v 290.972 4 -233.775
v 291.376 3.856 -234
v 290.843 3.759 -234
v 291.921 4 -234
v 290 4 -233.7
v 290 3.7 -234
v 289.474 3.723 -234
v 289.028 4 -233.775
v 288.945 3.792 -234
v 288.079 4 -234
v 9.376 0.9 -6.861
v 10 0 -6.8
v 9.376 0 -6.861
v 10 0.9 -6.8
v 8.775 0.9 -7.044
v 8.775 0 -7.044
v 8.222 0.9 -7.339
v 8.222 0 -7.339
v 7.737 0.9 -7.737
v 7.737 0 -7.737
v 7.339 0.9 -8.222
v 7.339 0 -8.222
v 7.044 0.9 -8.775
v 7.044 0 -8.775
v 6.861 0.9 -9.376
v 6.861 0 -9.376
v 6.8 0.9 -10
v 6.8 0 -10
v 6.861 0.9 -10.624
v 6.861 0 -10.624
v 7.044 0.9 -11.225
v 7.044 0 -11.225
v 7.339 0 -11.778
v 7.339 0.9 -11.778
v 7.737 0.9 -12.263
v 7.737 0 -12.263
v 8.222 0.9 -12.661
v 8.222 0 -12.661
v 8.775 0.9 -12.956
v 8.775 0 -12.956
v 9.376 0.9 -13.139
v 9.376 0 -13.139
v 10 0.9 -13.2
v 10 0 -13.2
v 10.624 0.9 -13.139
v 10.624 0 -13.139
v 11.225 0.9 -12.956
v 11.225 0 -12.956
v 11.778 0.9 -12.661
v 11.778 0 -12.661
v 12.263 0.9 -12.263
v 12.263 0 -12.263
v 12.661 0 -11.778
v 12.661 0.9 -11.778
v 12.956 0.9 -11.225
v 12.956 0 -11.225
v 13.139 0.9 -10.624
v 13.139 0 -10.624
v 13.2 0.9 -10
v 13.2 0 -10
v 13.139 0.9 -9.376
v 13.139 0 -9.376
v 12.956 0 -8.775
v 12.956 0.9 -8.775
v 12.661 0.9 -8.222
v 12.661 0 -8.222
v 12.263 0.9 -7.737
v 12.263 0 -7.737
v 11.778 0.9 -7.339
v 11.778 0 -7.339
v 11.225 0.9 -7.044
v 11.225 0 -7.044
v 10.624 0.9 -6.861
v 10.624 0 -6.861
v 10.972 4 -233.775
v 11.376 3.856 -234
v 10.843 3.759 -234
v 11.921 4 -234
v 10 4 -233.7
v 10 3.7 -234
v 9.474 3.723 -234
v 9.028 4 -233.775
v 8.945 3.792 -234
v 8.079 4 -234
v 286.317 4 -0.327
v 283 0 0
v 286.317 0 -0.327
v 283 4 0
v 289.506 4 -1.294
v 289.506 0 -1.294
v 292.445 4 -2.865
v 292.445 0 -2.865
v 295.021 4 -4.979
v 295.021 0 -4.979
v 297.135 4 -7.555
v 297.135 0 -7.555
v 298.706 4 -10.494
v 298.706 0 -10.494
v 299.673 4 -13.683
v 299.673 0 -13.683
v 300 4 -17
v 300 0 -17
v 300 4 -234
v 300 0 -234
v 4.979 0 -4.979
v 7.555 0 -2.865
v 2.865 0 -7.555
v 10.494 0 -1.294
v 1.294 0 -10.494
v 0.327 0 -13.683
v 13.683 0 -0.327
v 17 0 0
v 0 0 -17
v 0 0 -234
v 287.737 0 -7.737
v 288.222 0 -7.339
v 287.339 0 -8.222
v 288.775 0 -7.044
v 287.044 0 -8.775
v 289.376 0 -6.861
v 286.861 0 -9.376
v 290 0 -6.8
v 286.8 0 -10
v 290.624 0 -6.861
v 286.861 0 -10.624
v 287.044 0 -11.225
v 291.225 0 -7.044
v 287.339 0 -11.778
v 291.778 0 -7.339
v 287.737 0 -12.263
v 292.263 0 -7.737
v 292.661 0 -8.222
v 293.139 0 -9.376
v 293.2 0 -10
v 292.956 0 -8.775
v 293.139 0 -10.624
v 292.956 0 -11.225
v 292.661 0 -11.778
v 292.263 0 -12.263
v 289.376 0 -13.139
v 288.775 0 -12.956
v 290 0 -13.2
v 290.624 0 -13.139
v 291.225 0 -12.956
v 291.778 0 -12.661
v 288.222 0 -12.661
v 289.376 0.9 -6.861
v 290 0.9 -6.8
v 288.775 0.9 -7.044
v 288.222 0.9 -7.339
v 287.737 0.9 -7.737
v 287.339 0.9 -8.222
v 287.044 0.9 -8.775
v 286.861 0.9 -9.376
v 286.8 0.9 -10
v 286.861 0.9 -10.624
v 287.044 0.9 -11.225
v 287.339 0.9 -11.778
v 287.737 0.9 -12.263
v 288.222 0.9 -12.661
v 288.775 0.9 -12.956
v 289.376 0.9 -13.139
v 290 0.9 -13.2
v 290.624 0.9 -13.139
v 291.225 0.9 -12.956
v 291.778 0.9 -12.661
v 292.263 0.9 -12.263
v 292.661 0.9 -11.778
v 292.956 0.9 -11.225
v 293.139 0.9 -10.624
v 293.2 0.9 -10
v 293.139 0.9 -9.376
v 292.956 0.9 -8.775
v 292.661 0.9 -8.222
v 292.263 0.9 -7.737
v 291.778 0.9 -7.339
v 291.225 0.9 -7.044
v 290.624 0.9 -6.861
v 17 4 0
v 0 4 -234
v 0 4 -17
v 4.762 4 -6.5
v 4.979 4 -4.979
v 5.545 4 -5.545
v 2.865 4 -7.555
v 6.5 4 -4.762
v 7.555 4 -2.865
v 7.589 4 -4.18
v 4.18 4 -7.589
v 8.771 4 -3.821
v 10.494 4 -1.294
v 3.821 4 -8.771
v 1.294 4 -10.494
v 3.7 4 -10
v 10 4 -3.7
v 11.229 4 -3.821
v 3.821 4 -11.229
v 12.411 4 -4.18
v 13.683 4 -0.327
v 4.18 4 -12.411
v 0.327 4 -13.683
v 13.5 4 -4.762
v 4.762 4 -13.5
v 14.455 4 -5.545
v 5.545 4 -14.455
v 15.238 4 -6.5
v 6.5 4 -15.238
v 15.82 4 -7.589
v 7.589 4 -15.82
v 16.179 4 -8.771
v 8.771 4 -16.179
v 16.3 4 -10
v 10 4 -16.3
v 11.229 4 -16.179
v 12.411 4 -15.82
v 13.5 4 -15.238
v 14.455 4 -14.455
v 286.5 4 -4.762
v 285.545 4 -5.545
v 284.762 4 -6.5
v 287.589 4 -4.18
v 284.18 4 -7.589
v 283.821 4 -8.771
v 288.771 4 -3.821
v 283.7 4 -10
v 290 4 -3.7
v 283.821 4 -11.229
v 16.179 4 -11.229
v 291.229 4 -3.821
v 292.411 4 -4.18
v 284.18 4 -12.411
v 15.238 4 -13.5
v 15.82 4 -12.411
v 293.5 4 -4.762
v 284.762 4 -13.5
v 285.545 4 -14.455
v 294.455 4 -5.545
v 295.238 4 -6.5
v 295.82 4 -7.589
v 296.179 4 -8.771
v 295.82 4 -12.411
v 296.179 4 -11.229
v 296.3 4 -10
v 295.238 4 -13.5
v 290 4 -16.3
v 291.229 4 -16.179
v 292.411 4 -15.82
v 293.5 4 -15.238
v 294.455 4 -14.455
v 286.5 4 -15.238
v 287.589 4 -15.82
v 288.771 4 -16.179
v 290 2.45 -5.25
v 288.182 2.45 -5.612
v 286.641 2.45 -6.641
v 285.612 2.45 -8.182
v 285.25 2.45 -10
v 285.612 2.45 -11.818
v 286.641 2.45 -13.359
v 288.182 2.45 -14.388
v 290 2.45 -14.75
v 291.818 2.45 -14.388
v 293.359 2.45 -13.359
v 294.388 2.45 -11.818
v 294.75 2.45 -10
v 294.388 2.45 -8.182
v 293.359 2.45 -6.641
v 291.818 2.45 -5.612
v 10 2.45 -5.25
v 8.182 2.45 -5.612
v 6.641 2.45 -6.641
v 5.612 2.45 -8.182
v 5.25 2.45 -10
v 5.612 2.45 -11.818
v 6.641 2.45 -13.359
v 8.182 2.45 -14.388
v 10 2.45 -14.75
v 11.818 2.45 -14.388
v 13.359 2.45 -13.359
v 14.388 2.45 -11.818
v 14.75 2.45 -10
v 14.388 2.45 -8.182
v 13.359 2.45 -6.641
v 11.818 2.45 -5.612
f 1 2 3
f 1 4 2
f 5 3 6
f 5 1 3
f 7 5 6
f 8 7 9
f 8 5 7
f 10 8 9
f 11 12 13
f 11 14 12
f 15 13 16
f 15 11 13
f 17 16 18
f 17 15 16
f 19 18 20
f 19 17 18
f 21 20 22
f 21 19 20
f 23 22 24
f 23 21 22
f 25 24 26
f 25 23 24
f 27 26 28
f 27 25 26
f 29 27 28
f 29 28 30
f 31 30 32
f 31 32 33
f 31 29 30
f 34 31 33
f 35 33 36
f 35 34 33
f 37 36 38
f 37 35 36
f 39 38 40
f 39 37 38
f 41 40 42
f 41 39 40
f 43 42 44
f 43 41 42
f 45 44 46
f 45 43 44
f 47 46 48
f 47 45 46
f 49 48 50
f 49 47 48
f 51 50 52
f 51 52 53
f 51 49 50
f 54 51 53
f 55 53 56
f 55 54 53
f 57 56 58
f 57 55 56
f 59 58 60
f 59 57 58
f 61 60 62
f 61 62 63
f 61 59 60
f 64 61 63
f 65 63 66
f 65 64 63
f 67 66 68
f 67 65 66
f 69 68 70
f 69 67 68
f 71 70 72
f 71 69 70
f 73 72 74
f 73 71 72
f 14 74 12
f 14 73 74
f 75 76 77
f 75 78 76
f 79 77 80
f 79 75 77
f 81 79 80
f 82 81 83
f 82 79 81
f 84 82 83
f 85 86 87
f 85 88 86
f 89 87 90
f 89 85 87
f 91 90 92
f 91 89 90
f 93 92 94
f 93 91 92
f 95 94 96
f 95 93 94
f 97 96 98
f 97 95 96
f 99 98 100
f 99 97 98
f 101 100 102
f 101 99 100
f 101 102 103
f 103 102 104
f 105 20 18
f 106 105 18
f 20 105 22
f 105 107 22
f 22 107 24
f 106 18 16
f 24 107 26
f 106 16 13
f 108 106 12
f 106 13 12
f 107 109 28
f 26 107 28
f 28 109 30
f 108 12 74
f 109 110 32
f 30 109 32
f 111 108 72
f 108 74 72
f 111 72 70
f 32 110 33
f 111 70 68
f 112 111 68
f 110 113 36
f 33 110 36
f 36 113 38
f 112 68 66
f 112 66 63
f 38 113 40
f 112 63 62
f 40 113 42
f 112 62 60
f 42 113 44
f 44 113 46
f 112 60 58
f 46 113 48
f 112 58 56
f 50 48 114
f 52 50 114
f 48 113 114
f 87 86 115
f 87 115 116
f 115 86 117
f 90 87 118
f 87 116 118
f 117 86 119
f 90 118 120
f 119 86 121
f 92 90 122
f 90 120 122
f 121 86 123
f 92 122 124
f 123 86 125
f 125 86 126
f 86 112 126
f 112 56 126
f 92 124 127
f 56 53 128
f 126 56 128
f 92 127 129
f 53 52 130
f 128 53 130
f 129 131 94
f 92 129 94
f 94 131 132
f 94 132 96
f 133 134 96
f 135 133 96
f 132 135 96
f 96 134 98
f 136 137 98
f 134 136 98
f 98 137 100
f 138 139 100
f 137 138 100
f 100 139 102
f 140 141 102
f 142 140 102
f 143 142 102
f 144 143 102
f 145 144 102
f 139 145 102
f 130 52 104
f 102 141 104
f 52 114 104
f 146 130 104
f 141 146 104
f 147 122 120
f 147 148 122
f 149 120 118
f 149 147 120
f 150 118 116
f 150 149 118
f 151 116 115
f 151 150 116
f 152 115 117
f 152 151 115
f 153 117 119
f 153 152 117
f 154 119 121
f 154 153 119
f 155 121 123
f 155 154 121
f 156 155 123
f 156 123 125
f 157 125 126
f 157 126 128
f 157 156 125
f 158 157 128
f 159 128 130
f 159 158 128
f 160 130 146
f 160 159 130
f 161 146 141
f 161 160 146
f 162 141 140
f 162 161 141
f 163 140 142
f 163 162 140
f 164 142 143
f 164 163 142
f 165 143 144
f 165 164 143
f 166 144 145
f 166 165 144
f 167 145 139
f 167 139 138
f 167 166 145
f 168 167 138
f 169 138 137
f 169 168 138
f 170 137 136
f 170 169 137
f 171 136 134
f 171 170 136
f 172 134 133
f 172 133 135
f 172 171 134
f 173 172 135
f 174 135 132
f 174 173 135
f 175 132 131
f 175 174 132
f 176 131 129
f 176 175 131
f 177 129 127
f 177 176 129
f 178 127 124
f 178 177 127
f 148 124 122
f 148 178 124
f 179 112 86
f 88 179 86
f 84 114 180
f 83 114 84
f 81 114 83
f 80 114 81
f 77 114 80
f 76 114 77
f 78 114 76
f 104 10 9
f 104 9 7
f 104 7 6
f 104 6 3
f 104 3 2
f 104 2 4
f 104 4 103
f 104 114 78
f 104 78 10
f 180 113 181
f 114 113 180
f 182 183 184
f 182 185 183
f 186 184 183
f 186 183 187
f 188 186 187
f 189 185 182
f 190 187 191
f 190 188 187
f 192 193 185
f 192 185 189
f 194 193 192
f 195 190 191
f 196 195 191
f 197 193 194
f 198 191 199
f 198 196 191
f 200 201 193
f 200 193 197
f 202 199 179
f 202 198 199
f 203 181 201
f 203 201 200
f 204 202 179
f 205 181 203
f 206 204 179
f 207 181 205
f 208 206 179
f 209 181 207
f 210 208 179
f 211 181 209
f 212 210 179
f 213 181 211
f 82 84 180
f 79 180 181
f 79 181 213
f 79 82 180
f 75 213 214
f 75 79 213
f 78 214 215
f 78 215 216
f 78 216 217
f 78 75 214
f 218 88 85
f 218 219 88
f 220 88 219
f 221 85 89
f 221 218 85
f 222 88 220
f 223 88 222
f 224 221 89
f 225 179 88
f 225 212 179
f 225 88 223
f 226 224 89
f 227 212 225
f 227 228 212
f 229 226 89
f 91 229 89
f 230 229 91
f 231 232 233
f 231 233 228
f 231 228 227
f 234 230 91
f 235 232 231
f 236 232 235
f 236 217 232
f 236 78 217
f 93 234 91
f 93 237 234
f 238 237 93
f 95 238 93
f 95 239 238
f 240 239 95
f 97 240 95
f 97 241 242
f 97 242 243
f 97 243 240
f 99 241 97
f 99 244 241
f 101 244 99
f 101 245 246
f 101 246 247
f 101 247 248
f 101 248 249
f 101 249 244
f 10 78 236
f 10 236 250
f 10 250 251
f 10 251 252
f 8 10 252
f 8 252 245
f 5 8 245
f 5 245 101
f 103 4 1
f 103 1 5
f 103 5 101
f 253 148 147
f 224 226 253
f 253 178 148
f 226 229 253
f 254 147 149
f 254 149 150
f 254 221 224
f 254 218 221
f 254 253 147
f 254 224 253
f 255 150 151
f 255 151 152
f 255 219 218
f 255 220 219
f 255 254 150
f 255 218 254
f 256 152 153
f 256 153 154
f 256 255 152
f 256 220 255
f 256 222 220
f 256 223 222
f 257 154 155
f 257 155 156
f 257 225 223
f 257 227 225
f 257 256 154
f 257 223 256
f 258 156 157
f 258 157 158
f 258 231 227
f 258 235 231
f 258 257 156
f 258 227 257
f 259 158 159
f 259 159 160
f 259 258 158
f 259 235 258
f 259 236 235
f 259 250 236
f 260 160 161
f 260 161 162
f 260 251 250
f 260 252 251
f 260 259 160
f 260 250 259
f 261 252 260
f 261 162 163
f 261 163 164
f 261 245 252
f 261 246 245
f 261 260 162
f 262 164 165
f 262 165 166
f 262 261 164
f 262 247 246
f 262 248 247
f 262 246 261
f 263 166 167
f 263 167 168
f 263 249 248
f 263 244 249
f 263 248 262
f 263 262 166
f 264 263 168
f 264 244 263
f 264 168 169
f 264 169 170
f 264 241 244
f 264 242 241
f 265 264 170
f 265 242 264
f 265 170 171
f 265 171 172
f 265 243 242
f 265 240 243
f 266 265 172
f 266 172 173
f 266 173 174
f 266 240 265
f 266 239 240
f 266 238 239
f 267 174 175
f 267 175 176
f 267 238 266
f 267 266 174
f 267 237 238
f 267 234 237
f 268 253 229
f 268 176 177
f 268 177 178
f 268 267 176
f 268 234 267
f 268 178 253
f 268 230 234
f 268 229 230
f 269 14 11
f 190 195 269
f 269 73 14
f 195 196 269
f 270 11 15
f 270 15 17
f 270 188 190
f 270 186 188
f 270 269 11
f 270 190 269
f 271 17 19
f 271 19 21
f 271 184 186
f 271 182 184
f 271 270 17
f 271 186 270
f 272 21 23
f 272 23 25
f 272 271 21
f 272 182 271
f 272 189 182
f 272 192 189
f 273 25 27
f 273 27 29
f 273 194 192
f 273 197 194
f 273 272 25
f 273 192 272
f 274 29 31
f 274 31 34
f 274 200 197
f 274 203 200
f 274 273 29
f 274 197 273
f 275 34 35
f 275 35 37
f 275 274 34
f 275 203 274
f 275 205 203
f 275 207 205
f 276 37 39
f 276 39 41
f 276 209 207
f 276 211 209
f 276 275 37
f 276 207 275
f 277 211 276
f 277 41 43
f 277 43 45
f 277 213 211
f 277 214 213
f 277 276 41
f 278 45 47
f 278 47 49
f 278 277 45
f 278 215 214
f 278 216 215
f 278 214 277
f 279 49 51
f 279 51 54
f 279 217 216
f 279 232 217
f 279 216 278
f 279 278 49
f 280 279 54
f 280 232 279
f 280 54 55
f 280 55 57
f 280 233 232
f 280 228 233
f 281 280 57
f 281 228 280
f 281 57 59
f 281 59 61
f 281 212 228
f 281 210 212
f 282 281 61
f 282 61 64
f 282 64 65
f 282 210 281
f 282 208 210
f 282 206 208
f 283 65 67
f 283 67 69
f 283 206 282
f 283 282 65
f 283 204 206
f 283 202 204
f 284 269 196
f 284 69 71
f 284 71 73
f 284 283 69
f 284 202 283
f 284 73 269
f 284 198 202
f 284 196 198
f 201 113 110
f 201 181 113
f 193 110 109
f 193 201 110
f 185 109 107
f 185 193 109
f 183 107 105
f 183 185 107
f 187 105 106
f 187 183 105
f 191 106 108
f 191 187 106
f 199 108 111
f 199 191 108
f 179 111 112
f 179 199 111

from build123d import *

# Parameters (mm, degrees)
SKIZZE1_W                                   = 300
SKIZZE1_H                                   = 234
AUFSATZ_LINEAR_AUSTRAGEN1_DEPTH             = 4
VERRUNDUNG1_R                               = 17
FORMSENKUNG_F_R_M6_SENKSCHRAUBE_MIT_2_COUNT = 2
FORMSENKUNG_F_R_M6_SENKSCHRAUBE_MIT_2_PITCH = 280
FORMSENKUNG_F_R_M6_SENKSCHRAUBE_MIT_3_COUNT = 2
FORMSENKUNG_F_R_M6_SENKSCHRAUBE_MIT_3_PITCH = 362.35341864
FORMSENKUNG_F_R_M6_SENKSCHRAUBE_MIT_4_COUNT = 2
FORMSENKUNG_F_R_M6_SENKSCHRAUBE_MIT_4_PITCH = 230


with BuildPart() as part:
    # Skizze1 → Aufsatz-Linear austragen1 (new body)
    with BuildSketch(Plane(origin=(0, 0, 0), x_dir=(1, 0, 0), z_dir=(0, 1, 0))):
        with Locations((150, 117)):
            Rectangle(SKIZZE1_W, SKIZZE1_H)
    extrude(amount=AUFSATZ_LINEAR_AUSTRAGEN1_DEPTH)

    # Verrundung1
    verrundung1_edges = [part.edges().sort_by_distance(p)[0] for p in [
        (300, 2, 0),
        (0, 2, 0),
    ]]
    fillet(verrundung1_edges, radius=VERRUNDUNG1_R)

    # Skizze2 → Formsenkung für M6 Senkschraube mit Schlitz/Kreuzschlitz1 (revolve, cut)
    with BuildSketch(Plane(origin=(10, 4, -10), x_dir=(0, 0, 1), z_dir=(1, 0, 0))):
        Polygon((0, 0), (0, 4), (3.2, 4), (3.2, 3.1), (6.3, 0), align=None)
    formsenkung_f_r_m6_senkschraube_mit_schl = revolve(axis=Axis((10, 10.35, -10), (0, -1, 0)), mode=Mode.SUBTRACT)

    # Formsenkung f_r M6 Senkschraube mit  2: Formsenkung für M6 Senkschraube mit Schlitz/Kreuzschlitz1 ×2
    with Locations(*[(i * FORMSENKUNG_F_R_M6_SENKSCHRAUBE_MIT_2_PITCH, 0, 0) for i in range(1, FORMSENKUNG_F_R_M6_SENKSCHRAUBE_MIT_2_COUNT)]):
        add(formsenkung_f_r_m6_senkschraube_mit_schl, mode=Mode.SUBTRACT)

    # Formsenkung f_r M6 Senkschraube mit  3: Formsenkung für M6 Senkschraube mit Schlitz/Kreuzschlitz1 ×2
    with Locations(*[Vector(0.7727262545252342, 0, -0.6347394233600139) * (i * FORMSENKUNG_F_R_M6_SENKSCHRAUBE_MIT_3_PITCH) for i in range(1, FORMSENKUNG_F_R_M6_SENKSCHRAUBE_MIT_3_COUNT)]):
        add(formsenkung_f_r_m6_senkschraube_mit_schl, mode=Mode.SUBTRACT)

    # Formsenkung f_r M6 Senkschraube mit  4: Formsenkung für M6 Senkschraube mit Schlitz/Kreuzschlitz1 ×2
    with Locations(*[(0, 0, -i * FORMSENKUNG_F_R_M6_SENKSCHRAUBE_MIT_4_PITCH) for i in range(1, FORMSENKUNG_F_R_M6_SENKSCHRAUBE_MIT_4_COUNT)]):
        add(formsenkung_f_r_m6_senkschraube_mit_schl, mode=Mode.SUBTRACT)


solid = part.part
